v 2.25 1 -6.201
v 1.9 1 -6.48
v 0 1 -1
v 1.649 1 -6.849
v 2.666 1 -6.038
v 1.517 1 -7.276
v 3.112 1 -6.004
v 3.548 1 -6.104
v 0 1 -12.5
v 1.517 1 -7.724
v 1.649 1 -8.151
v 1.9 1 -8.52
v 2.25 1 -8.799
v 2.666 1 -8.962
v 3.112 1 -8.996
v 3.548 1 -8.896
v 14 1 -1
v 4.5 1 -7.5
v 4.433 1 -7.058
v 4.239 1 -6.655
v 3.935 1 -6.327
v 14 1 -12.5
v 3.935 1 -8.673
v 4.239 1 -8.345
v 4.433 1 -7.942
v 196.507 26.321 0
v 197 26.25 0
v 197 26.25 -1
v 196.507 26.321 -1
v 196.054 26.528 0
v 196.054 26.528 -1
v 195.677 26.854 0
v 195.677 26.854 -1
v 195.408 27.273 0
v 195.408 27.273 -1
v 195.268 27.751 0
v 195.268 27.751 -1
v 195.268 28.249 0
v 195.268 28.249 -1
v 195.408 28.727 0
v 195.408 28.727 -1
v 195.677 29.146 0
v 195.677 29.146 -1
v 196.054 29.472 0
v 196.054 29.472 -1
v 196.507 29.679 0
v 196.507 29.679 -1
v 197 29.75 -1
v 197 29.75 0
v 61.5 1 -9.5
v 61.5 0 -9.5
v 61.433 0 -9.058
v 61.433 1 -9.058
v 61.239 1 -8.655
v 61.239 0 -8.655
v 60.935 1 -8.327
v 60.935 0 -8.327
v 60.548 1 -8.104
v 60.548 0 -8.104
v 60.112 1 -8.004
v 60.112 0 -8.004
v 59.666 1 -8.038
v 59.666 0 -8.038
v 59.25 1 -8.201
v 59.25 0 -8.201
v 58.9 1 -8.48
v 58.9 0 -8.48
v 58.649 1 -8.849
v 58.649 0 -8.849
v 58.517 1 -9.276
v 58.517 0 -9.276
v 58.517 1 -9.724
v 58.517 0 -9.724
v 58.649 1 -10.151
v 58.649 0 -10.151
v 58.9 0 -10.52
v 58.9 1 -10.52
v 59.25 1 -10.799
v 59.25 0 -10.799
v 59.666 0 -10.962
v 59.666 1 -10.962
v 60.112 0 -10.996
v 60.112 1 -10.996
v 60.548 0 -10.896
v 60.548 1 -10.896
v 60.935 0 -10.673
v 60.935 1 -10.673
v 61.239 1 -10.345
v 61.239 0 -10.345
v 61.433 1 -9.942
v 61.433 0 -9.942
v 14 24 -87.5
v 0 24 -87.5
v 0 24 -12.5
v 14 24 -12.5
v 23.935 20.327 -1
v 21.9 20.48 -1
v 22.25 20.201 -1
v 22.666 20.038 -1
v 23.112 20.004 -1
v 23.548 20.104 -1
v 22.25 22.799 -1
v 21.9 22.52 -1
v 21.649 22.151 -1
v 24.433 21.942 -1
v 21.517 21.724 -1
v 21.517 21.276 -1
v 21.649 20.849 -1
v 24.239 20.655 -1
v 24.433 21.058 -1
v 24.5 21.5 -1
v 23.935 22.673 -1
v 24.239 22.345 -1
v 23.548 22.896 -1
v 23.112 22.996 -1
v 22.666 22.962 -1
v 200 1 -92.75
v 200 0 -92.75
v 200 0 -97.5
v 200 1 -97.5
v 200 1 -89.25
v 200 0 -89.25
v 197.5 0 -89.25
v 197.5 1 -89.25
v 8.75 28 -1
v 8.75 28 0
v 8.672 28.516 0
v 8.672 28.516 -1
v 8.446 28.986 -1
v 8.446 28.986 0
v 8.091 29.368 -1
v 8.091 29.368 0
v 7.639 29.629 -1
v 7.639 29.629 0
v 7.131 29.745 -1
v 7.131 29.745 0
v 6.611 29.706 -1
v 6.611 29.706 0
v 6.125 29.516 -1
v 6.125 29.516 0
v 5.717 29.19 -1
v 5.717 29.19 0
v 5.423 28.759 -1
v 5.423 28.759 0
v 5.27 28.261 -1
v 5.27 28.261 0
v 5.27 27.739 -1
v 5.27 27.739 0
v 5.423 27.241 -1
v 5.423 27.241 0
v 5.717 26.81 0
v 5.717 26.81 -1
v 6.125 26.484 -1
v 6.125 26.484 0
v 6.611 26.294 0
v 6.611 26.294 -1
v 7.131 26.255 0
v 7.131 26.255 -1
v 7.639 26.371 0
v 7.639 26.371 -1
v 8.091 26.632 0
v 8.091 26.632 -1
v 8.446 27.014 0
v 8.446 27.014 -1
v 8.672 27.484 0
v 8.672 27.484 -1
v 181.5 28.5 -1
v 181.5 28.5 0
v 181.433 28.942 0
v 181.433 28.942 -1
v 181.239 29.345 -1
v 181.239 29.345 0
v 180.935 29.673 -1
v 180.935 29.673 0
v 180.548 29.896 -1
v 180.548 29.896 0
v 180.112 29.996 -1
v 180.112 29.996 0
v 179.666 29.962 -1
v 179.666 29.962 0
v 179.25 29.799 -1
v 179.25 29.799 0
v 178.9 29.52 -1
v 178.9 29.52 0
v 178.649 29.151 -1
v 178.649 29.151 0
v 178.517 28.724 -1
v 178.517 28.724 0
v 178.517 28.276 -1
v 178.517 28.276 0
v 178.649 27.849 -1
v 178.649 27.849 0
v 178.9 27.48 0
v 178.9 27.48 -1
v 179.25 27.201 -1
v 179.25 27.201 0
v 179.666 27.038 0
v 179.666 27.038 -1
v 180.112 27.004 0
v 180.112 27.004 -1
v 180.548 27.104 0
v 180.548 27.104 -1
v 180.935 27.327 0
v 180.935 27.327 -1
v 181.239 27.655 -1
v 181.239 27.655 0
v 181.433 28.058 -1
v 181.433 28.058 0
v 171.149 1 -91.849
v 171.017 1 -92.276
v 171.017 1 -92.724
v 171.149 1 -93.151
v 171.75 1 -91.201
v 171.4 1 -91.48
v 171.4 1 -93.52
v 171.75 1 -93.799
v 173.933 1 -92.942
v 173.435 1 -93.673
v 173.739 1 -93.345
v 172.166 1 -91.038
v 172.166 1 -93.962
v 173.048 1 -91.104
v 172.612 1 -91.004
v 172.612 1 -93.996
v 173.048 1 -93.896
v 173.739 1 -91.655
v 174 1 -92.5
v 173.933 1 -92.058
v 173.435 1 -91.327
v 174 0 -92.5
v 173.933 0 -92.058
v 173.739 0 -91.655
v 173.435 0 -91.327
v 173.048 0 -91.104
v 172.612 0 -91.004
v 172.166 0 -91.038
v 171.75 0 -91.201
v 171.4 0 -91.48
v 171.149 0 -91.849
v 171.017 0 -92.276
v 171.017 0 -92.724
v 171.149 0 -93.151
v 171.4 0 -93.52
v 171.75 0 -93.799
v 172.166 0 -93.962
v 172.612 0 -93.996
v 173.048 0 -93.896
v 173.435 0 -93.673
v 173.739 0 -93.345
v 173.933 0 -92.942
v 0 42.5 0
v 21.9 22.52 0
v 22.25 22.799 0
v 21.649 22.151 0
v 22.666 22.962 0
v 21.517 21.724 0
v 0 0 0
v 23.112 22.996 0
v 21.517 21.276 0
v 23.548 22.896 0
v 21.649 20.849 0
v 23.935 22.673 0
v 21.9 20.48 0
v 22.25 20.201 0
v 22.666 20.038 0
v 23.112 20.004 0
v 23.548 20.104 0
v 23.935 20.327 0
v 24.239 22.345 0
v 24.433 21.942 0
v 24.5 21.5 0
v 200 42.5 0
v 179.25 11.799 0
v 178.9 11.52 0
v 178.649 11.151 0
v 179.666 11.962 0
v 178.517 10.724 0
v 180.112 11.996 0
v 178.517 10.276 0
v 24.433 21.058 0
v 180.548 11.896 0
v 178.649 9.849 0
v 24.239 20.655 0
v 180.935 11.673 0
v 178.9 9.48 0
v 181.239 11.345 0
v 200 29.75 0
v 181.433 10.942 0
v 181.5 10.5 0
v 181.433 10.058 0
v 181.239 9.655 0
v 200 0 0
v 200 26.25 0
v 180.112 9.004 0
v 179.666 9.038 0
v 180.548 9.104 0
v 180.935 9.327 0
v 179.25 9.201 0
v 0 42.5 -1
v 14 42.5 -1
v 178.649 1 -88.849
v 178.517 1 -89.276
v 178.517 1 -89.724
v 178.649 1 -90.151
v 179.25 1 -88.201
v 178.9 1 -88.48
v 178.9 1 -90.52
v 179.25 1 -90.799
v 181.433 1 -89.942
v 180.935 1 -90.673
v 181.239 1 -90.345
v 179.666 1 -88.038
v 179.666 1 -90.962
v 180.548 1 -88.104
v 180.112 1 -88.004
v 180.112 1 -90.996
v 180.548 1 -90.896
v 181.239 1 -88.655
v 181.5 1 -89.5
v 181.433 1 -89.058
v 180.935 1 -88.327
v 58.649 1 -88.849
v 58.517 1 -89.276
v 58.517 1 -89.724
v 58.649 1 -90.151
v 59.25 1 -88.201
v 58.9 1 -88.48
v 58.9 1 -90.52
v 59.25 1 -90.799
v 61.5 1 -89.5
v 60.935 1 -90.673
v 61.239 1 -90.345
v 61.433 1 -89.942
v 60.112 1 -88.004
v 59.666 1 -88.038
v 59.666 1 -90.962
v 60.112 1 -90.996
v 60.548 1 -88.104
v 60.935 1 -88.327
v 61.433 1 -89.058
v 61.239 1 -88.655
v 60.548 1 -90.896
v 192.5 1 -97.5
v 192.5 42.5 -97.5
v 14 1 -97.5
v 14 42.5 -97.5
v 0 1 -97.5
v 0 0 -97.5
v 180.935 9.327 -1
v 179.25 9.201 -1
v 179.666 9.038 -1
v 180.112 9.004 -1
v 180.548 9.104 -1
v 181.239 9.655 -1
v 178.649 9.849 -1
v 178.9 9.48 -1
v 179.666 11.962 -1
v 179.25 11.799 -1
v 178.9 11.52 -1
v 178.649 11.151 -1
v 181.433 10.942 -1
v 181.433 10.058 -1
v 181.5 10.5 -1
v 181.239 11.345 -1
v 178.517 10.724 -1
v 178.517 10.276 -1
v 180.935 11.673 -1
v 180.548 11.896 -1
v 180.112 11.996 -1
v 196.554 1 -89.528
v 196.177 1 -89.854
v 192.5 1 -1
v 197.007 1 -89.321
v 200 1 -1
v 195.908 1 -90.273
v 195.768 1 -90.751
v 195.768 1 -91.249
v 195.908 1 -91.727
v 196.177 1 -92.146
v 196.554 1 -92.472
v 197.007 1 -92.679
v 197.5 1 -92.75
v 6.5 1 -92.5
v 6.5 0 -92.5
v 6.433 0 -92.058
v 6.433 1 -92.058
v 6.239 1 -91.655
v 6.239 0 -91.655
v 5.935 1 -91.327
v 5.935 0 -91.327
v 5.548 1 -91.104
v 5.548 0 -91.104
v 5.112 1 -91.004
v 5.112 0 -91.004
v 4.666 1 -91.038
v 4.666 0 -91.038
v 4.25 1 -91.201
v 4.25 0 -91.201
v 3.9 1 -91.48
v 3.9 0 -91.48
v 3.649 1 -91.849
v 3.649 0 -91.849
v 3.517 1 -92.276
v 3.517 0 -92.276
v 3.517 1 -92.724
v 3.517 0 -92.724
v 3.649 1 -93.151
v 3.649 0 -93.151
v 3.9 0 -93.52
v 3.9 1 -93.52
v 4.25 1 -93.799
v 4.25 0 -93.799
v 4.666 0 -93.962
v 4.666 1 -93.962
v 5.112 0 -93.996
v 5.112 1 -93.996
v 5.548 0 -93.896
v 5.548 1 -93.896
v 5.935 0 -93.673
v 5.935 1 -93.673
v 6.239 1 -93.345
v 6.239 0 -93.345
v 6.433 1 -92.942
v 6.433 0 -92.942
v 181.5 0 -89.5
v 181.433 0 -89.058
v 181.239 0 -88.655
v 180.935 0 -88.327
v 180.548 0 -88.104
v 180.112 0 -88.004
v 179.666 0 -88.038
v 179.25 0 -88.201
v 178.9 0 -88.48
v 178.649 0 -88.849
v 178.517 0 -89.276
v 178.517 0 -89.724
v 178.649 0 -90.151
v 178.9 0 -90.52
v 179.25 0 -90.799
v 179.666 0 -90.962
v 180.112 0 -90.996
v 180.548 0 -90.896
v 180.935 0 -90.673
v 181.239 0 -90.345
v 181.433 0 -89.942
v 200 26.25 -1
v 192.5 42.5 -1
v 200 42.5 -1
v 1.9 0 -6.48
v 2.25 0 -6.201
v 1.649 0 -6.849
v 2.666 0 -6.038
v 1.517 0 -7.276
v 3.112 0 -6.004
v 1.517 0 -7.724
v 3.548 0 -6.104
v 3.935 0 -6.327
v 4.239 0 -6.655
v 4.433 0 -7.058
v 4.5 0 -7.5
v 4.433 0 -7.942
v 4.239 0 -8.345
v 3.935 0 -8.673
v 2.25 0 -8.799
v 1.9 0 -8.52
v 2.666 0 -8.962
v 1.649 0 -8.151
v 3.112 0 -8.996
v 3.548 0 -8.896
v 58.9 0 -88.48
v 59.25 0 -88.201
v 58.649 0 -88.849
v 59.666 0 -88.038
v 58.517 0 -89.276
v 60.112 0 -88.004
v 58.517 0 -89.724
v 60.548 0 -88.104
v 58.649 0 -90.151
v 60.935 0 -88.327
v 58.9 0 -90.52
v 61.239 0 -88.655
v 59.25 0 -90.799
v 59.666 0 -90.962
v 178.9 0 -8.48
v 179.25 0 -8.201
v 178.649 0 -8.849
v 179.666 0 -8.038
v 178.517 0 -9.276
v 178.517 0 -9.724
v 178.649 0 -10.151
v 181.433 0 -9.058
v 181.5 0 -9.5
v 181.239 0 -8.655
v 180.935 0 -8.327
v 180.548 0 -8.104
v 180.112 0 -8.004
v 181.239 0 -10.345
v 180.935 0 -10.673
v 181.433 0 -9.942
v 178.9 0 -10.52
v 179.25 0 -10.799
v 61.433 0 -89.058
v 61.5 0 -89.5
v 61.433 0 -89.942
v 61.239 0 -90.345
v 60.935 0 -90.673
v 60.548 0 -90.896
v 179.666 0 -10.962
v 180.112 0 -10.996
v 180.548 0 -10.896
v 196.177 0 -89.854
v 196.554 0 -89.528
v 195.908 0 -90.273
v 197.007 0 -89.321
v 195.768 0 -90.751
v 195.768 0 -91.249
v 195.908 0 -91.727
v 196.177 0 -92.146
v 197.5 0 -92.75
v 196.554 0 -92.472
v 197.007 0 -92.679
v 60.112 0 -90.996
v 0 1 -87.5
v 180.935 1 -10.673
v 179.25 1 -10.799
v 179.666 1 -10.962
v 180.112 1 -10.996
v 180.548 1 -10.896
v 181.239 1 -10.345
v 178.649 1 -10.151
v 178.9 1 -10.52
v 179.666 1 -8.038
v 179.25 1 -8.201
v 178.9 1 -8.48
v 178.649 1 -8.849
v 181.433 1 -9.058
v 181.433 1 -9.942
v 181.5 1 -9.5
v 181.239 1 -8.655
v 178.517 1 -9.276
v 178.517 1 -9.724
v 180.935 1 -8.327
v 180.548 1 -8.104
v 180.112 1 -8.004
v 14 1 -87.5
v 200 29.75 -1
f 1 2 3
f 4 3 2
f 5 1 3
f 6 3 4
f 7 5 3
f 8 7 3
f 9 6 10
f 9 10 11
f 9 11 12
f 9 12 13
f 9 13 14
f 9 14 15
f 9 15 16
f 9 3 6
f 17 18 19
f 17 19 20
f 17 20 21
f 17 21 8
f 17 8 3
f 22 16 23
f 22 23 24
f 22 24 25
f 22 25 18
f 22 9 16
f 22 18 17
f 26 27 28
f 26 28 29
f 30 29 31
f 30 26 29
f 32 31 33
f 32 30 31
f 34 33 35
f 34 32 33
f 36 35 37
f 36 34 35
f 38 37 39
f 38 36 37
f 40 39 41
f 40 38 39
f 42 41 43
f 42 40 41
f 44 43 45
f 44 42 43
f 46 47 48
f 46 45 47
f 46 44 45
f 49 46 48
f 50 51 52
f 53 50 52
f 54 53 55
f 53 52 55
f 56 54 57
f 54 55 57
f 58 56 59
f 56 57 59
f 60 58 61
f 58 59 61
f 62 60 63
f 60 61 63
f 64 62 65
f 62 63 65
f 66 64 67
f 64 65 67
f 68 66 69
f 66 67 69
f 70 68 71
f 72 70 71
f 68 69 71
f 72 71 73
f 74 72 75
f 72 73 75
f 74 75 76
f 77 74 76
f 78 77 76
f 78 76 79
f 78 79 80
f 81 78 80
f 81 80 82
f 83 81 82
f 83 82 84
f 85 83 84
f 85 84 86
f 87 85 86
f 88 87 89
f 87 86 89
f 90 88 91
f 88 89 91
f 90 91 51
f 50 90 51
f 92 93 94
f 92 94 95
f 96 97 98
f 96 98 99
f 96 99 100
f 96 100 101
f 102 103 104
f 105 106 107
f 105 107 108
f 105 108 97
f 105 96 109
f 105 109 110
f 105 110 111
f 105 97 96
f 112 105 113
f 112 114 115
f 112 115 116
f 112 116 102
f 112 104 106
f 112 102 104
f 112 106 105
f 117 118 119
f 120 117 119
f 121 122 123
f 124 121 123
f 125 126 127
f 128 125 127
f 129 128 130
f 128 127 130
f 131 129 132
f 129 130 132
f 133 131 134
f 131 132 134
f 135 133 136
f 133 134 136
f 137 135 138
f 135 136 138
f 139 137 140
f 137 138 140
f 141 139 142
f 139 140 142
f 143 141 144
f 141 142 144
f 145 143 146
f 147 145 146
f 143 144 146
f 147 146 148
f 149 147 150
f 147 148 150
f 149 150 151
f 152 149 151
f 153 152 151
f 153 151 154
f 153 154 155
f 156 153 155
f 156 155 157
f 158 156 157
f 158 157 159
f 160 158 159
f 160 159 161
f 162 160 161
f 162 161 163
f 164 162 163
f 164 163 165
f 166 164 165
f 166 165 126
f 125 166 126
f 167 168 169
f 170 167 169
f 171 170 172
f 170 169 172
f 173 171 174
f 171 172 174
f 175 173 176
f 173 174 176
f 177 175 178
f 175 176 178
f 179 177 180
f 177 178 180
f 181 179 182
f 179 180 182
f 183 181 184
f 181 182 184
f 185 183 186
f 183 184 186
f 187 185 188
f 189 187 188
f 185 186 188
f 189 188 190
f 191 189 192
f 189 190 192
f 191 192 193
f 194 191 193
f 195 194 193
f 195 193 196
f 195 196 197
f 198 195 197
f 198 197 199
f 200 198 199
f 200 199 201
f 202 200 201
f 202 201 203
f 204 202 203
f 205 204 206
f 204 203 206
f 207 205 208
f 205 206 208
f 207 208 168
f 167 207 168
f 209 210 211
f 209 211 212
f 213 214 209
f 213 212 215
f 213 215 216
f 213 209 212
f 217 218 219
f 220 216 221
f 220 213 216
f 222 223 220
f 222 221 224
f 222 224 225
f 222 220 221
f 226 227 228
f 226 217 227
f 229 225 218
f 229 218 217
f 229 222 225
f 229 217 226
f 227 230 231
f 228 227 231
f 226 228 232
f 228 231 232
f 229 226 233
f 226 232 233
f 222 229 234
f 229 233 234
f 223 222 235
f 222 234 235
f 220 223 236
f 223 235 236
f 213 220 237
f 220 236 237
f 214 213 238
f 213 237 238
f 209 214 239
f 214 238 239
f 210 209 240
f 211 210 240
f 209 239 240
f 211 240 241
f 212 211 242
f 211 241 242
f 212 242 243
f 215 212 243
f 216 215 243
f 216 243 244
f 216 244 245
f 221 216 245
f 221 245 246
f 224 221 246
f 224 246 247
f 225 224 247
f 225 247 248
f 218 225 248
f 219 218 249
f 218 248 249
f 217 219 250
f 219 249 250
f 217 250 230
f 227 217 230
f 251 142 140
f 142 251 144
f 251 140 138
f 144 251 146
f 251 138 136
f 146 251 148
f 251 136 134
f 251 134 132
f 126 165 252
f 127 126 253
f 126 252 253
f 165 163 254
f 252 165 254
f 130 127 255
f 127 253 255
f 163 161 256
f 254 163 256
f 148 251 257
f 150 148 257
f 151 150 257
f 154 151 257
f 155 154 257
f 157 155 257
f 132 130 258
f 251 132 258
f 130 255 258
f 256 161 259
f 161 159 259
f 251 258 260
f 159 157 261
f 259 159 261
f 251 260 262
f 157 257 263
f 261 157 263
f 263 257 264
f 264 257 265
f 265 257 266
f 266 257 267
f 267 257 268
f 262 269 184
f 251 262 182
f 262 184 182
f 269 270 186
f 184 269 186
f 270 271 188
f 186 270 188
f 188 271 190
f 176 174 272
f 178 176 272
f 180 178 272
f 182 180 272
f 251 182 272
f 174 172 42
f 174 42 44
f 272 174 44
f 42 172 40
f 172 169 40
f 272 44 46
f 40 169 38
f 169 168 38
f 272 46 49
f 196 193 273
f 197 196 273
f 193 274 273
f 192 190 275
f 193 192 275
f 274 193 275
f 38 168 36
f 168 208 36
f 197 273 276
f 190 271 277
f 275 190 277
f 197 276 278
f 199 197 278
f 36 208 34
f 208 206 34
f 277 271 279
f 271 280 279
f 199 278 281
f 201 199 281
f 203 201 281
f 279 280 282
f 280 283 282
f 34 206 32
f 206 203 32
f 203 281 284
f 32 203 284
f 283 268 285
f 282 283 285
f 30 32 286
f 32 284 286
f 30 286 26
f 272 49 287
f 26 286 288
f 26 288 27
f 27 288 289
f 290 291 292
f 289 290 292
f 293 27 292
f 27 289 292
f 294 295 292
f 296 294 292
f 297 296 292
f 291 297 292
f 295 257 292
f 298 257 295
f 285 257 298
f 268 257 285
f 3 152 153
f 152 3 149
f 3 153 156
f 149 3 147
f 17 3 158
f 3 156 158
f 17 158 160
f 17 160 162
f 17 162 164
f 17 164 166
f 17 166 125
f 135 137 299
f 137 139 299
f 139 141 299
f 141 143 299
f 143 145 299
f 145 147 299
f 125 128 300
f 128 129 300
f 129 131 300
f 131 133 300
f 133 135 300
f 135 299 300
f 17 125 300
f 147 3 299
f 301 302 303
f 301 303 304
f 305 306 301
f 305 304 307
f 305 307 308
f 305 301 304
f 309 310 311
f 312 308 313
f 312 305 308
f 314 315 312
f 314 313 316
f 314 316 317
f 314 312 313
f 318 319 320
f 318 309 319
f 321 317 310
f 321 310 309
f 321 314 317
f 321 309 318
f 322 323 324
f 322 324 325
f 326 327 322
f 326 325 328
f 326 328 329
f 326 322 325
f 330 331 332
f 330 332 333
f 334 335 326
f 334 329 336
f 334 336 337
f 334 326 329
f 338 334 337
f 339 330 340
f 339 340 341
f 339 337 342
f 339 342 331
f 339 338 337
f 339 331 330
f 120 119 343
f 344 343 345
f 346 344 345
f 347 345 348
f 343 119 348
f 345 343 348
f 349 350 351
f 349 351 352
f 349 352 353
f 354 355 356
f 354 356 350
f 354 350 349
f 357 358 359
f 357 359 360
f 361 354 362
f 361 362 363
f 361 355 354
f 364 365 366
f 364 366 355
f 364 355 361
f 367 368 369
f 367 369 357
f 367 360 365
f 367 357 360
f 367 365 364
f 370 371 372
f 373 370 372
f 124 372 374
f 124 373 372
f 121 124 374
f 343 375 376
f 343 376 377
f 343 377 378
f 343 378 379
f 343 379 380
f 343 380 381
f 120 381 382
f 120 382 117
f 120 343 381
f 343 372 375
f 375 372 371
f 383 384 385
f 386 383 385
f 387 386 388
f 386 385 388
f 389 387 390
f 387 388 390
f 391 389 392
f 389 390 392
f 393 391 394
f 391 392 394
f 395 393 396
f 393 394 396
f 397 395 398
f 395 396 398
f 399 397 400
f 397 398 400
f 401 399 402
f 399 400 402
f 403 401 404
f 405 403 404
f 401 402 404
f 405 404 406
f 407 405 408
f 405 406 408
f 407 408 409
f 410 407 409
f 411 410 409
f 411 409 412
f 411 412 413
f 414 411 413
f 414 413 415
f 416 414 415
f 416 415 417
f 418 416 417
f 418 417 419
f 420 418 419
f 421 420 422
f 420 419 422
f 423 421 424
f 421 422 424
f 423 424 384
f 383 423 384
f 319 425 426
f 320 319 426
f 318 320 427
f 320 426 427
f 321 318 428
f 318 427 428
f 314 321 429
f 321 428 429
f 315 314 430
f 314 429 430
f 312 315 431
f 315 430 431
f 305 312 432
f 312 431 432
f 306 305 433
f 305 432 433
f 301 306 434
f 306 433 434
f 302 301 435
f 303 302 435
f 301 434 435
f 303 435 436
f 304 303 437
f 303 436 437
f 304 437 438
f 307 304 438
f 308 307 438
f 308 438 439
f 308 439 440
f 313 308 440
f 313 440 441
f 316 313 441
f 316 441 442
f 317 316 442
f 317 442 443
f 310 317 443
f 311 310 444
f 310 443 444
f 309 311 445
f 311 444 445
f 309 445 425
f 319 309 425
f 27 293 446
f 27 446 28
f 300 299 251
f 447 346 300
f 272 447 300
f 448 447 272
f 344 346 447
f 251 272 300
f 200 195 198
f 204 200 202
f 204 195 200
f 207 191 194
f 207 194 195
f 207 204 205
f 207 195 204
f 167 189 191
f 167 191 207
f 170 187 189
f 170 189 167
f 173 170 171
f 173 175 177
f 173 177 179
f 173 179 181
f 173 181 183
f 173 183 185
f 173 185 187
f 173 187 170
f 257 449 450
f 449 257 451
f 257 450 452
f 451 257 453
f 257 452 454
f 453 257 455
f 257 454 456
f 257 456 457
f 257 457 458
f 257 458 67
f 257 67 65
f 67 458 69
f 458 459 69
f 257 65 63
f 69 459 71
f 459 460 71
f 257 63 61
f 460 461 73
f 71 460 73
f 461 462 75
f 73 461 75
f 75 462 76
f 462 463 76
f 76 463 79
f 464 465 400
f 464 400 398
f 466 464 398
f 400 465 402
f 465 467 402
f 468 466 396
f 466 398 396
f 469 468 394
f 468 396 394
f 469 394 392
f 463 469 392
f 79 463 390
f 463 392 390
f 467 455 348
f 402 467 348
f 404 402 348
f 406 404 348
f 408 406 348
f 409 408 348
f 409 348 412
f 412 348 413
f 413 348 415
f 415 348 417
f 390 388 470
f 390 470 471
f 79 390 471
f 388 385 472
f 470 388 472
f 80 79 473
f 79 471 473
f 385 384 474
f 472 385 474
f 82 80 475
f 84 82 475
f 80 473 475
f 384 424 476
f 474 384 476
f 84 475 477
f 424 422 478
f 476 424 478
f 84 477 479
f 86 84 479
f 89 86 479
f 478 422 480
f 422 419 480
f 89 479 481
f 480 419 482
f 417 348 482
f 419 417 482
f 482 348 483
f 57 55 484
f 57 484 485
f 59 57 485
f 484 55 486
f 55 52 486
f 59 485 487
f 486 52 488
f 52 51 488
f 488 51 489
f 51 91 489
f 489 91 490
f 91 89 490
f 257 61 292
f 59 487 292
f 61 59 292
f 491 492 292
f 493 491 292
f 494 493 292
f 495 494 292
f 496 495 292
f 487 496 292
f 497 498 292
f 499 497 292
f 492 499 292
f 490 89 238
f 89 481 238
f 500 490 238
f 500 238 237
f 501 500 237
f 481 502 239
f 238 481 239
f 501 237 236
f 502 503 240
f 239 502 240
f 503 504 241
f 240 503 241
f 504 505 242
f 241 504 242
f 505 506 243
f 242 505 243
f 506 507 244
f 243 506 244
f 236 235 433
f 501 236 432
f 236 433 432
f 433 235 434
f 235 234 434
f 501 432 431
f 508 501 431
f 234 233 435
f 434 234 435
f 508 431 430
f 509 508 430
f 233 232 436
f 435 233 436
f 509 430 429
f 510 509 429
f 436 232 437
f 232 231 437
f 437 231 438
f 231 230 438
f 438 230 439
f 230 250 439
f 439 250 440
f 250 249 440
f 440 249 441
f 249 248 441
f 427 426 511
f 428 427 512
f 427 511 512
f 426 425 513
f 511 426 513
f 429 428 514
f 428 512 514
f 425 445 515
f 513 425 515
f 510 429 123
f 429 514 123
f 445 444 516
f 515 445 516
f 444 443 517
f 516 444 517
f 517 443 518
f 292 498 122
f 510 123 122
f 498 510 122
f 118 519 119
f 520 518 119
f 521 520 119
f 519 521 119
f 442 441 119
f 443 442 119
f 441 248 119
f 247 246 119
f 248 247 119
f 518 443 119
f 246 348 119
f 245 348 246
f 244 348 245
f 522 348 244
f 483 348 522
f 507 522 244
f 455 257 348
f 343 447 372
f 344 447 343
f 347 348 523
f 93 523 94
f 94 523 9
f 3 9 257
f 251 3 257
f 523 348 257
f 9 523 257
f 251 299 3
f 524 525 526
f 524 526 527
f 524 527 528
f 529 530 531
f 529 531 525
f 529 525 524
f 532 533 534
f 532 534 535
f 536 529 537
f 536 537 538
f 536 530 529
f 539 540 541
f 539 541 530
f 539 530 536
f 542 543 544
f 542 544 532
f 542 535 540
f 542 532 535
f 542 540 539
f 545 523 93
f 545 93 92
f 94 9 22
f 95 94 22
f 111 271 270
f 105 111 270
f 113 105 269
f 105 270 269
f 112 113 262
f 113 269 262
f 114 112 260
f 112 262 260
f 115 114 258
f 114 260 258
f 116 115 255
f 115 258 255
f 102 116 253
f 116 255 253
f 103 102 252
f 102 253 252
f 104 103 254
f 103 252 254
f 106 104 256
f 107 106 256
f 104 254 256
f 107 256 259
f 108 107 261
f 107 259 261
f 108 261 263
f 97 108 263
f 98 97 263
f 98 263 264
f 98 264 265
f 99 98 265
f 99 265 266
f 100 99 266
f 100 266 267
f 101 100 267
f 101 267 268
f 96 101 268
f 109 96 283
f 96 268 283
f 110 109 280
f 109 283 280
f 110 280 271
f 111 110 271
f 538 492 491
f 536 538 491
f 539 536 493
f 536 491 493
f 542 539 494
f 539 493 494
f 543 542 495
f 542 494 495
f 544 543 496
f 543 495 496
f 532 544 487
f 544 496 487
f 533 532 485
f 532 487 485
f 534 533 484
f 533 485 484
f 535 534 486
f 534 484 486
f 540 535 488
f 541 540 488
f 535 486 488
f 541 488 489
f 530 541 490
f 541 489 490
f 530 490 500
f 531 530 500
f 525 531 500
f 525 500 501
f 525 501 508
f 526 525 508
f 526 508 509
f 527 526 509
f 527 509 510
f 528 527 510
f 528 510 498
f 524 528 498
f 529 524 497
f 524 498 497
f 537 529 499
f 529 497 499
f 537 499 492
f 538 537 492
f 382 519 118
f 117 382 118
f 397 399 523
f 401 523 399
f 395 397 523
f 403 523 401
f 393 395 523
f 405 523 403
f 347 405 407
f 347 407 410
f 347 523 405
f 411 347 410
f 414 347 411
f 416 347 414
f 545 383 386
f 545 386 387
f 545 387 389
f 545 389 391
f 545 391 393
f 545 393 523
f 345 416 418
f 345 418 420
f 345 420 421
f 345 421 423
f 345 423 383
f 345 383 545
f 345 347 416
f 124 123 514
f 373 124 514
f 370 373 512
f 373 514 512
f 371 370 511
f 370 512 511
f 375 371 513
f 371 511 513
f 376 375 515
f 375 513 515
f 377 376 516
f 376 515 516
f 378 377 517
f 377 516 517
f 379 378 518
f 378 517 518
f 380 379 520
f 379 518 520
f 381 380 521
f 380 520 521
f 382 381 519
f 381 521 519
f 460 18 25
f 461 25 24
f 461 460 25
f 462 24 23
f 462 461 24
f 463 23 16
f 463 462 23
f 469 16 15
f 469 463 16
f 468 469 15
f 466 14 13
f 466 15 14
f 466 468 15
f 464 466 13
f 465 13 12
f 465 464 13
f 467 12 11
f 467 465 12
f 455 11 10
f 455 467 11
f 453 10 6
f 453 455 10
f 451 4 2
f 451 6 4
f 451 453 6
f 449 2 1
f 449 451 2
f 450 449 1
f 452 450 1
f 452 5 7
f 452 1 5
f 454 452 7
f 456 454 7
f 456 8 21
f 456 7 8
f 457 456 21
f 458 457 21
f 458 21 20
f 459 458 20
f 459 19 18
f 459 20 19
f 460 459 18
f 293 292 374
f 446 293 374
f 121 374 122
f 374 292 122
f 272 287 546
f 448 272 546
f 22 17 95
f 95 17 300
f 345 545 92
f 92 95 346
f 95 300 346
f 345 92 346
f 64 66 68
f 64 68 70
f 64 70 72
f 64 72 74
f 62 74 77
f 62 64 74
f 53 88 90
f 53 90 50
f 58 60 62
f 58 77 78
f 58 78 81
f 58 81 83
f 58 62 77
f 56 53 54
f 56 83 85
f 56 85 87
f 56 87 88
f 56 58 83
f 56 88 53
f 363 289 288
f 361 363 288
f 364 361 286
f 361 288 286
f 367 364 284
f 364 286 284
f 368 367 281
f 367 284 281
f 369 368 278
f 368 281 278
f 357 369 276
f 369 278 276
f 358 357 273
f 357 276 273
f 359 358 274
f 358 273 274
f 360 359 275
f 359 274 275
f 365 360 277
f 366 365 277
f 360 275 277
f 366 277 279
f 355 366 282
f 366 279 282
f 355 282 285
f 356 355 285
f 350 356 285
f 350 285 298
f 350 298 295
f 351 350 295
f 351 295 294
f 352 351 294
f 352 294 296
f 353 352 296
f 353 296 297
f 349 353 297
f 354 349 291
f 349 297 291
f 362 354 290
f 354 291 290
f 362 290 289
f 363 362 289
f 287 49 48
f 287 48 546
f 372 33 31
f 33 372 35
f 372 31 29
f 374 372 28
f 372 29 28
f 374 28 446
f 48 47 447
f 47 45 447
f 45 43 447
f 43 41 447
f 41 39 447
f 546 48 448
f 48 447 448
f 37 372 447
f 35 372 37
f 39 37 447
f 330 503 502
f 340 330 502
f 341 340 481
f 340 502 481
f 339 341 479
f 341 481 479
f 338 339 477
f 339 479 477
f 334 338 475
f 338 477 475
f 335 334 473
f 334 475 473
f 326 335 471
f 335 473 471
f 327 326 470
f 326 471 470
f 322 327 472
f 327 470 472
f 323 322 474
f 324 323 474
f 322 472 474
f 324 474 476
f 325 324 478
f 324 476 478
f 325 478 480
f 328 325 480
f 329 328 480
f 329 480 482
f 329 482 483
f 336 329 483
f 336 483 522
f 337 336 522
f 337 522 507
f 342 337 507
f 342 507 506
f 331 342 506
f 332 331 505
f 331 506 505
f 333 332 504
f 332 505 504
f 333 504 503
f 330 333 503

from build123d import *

# Parameters (mm, degrees)
SKETCH1_R           = 1.5
BOSS_EXTRUDE1_DEPTH = 42.5
SKETCH2_W           = 7.5
SKETCH2_H           = 96.5
SKETCH2_W_2         = 14
CUT_EXTRUDE1_DEPTH  = 41.5
CUT_EXTRUDE2_REACH  = 99.5
SKETCH3_R           = 1.75
SKETCH4_W           = 14
SKETCH4_H           = 75
BOSS_EXTRUDE2_DEPTH = 23
SKETCH5_R           = 1.5
CUT_EXTRUDE3_DEPTH  = 1
SKETCH6_R           = 1.5
CUT_EXTRUDE4_DEPTH  = 1


with BuildPart() as part:
    # Sketch1 → Boss-Extrude1 (new body)
    with BuildSketch(Plane(origin=(0, 0, 0), x_dir=(1, 0, 0), z_dir=(0, 1, 0))):
        with BuildLine():
            Line((197.5, 92.75), (200, 92.75))
            Line((200, 92.75), (200, 97.5))
            Line((200, 97.5), (0, 97.5))
            Line((0, 97.5), (0, 0))
            Line((0, 0), (200, 0))
            Line((200, 0), (200, 89.25))
            Line((200, 89.25), (197.5, 89.25))
            ThreePointArc((197.5, 89.25), (195.75, 91), (197.5, 92.75))
        make_face()
        with Locations((3, 7.5)):
            Circle(SKETCH1_R, mode=Mode.SUBTRACT)
    extrude(amount=BOSS_EXTRUDE1_DEPTH)

    # Sketch2 → Cut-Extrude1 (cut)
    with BuildSketch(Plane(origin=(0, 42.5, 0), x_dir=(1, 0, 0), z_dir=(0, 1, 0))):
        with Locations((196.25, 49.25)):
            Rectangle(SKETCH2_W, SKETCH2_H)
        with Locations((7, 49.25)):
            Rectangle(SKETCH2_W_2, SKETCH2_H)
    extrude(amount=-CUT_EXTRUDE1_DEPTH, mode=Mode.SUBTRACT)

    # Sketch3 → Cut-Extrude2 (cut, up to next)
    with BuildSketch(Plane.XY, mode=Mode.PRIVATE) as cut_extrude2_sk1:
        with Locations((7, 28)):
            Circle(SKETCH3_R)
    cut_extrude2_tool1 = extrude(cut_extrude2_sk1.sketch, amount=-CUT_EXTRUDE2_REACH, mode=Mode.PRIVATE) & part.part
    add(cut_extrude2_tool1.solids().sort_by_distance((7, 28, 0))[0], mode=Mode.SUBTRACT)
    # Sketch3 → Cut-Extrude2 (cut, up to next)
    with BuildSketch(Plane.XY, mode=Mode.PRIVATE) as cut_extrude2_sk2:
        with BuildLine():
            Line((197, 29.75), (200, 29.75))
            Line((200, 29.75), (200, 26.25))
            Line((200, 26.25), (197, 26.25))
            ThreePointArc((197, 26.25), (195.25, 28), (197, 29.75))
        make_face()
    cut_extrude2_tool2 = extrude(cut_extrude2_sk2.sketch, amount=-CUT_EXTRUDE2_REACH, mode=Mode.PRIVATE) & part.part
    add(cut_extrude2_tool2.solids().sort_by_distance((197.795339, 28, 0))[0], mode=Mode.SUBTRACT)

    # Sketch4 → Boss-Extrude2 (add)
    with BuildSketch(Plane(origin=(0, 1, 0), x_dir=(1, 0, 0), z_dir=(0, 1, 0))):
        with Locations((7, 50)):
            Rectangle(SKETCH4_W, SKETCH4_H)
    extrude(amount=BOSS_EXTRUDE2_DEPTH)

    # Sketch5 → Cut-Extrude3 (cut)
    with BuildSketch(Plane.XY):
        with Locations((23, 21.5)):
            Circle(SKETCH5_R)
        with Locations((180, 10.5)):
            Circle(SKETCH5_R)
        with Locations((180, 28.5)):
            Circle(SKETCH5_R)
    extrude(amount=-CUT_EXTRUDE3_DEPTH, mode=Mode.SUBTRACT)

    # Sketch6 → Cut-Extrude4 (cut)
    with BuildSketch(Plane.XZ):
        with Locations((5, -92.5)):
            Circle(SKETCH6_R)
        with Locations((60, -9.5)):
            Circle(SKETCH6_R)
        with Locations((60, -89.5)):
            Circle(SKETCH6_R)
        with Locations((180, -89.5)):
            Circle(SKETCH6_R)
        with Locations((180, -9.5)):
            Circle(SKETCH6_R)
        with Locations((172.5, -92.5)):
            Circle(SKETCH6_R)
    extrude(amount=-CUT_EXTRUDE4_DEPTH, mode=Mode.SUBTRACT)


solid = part.part
